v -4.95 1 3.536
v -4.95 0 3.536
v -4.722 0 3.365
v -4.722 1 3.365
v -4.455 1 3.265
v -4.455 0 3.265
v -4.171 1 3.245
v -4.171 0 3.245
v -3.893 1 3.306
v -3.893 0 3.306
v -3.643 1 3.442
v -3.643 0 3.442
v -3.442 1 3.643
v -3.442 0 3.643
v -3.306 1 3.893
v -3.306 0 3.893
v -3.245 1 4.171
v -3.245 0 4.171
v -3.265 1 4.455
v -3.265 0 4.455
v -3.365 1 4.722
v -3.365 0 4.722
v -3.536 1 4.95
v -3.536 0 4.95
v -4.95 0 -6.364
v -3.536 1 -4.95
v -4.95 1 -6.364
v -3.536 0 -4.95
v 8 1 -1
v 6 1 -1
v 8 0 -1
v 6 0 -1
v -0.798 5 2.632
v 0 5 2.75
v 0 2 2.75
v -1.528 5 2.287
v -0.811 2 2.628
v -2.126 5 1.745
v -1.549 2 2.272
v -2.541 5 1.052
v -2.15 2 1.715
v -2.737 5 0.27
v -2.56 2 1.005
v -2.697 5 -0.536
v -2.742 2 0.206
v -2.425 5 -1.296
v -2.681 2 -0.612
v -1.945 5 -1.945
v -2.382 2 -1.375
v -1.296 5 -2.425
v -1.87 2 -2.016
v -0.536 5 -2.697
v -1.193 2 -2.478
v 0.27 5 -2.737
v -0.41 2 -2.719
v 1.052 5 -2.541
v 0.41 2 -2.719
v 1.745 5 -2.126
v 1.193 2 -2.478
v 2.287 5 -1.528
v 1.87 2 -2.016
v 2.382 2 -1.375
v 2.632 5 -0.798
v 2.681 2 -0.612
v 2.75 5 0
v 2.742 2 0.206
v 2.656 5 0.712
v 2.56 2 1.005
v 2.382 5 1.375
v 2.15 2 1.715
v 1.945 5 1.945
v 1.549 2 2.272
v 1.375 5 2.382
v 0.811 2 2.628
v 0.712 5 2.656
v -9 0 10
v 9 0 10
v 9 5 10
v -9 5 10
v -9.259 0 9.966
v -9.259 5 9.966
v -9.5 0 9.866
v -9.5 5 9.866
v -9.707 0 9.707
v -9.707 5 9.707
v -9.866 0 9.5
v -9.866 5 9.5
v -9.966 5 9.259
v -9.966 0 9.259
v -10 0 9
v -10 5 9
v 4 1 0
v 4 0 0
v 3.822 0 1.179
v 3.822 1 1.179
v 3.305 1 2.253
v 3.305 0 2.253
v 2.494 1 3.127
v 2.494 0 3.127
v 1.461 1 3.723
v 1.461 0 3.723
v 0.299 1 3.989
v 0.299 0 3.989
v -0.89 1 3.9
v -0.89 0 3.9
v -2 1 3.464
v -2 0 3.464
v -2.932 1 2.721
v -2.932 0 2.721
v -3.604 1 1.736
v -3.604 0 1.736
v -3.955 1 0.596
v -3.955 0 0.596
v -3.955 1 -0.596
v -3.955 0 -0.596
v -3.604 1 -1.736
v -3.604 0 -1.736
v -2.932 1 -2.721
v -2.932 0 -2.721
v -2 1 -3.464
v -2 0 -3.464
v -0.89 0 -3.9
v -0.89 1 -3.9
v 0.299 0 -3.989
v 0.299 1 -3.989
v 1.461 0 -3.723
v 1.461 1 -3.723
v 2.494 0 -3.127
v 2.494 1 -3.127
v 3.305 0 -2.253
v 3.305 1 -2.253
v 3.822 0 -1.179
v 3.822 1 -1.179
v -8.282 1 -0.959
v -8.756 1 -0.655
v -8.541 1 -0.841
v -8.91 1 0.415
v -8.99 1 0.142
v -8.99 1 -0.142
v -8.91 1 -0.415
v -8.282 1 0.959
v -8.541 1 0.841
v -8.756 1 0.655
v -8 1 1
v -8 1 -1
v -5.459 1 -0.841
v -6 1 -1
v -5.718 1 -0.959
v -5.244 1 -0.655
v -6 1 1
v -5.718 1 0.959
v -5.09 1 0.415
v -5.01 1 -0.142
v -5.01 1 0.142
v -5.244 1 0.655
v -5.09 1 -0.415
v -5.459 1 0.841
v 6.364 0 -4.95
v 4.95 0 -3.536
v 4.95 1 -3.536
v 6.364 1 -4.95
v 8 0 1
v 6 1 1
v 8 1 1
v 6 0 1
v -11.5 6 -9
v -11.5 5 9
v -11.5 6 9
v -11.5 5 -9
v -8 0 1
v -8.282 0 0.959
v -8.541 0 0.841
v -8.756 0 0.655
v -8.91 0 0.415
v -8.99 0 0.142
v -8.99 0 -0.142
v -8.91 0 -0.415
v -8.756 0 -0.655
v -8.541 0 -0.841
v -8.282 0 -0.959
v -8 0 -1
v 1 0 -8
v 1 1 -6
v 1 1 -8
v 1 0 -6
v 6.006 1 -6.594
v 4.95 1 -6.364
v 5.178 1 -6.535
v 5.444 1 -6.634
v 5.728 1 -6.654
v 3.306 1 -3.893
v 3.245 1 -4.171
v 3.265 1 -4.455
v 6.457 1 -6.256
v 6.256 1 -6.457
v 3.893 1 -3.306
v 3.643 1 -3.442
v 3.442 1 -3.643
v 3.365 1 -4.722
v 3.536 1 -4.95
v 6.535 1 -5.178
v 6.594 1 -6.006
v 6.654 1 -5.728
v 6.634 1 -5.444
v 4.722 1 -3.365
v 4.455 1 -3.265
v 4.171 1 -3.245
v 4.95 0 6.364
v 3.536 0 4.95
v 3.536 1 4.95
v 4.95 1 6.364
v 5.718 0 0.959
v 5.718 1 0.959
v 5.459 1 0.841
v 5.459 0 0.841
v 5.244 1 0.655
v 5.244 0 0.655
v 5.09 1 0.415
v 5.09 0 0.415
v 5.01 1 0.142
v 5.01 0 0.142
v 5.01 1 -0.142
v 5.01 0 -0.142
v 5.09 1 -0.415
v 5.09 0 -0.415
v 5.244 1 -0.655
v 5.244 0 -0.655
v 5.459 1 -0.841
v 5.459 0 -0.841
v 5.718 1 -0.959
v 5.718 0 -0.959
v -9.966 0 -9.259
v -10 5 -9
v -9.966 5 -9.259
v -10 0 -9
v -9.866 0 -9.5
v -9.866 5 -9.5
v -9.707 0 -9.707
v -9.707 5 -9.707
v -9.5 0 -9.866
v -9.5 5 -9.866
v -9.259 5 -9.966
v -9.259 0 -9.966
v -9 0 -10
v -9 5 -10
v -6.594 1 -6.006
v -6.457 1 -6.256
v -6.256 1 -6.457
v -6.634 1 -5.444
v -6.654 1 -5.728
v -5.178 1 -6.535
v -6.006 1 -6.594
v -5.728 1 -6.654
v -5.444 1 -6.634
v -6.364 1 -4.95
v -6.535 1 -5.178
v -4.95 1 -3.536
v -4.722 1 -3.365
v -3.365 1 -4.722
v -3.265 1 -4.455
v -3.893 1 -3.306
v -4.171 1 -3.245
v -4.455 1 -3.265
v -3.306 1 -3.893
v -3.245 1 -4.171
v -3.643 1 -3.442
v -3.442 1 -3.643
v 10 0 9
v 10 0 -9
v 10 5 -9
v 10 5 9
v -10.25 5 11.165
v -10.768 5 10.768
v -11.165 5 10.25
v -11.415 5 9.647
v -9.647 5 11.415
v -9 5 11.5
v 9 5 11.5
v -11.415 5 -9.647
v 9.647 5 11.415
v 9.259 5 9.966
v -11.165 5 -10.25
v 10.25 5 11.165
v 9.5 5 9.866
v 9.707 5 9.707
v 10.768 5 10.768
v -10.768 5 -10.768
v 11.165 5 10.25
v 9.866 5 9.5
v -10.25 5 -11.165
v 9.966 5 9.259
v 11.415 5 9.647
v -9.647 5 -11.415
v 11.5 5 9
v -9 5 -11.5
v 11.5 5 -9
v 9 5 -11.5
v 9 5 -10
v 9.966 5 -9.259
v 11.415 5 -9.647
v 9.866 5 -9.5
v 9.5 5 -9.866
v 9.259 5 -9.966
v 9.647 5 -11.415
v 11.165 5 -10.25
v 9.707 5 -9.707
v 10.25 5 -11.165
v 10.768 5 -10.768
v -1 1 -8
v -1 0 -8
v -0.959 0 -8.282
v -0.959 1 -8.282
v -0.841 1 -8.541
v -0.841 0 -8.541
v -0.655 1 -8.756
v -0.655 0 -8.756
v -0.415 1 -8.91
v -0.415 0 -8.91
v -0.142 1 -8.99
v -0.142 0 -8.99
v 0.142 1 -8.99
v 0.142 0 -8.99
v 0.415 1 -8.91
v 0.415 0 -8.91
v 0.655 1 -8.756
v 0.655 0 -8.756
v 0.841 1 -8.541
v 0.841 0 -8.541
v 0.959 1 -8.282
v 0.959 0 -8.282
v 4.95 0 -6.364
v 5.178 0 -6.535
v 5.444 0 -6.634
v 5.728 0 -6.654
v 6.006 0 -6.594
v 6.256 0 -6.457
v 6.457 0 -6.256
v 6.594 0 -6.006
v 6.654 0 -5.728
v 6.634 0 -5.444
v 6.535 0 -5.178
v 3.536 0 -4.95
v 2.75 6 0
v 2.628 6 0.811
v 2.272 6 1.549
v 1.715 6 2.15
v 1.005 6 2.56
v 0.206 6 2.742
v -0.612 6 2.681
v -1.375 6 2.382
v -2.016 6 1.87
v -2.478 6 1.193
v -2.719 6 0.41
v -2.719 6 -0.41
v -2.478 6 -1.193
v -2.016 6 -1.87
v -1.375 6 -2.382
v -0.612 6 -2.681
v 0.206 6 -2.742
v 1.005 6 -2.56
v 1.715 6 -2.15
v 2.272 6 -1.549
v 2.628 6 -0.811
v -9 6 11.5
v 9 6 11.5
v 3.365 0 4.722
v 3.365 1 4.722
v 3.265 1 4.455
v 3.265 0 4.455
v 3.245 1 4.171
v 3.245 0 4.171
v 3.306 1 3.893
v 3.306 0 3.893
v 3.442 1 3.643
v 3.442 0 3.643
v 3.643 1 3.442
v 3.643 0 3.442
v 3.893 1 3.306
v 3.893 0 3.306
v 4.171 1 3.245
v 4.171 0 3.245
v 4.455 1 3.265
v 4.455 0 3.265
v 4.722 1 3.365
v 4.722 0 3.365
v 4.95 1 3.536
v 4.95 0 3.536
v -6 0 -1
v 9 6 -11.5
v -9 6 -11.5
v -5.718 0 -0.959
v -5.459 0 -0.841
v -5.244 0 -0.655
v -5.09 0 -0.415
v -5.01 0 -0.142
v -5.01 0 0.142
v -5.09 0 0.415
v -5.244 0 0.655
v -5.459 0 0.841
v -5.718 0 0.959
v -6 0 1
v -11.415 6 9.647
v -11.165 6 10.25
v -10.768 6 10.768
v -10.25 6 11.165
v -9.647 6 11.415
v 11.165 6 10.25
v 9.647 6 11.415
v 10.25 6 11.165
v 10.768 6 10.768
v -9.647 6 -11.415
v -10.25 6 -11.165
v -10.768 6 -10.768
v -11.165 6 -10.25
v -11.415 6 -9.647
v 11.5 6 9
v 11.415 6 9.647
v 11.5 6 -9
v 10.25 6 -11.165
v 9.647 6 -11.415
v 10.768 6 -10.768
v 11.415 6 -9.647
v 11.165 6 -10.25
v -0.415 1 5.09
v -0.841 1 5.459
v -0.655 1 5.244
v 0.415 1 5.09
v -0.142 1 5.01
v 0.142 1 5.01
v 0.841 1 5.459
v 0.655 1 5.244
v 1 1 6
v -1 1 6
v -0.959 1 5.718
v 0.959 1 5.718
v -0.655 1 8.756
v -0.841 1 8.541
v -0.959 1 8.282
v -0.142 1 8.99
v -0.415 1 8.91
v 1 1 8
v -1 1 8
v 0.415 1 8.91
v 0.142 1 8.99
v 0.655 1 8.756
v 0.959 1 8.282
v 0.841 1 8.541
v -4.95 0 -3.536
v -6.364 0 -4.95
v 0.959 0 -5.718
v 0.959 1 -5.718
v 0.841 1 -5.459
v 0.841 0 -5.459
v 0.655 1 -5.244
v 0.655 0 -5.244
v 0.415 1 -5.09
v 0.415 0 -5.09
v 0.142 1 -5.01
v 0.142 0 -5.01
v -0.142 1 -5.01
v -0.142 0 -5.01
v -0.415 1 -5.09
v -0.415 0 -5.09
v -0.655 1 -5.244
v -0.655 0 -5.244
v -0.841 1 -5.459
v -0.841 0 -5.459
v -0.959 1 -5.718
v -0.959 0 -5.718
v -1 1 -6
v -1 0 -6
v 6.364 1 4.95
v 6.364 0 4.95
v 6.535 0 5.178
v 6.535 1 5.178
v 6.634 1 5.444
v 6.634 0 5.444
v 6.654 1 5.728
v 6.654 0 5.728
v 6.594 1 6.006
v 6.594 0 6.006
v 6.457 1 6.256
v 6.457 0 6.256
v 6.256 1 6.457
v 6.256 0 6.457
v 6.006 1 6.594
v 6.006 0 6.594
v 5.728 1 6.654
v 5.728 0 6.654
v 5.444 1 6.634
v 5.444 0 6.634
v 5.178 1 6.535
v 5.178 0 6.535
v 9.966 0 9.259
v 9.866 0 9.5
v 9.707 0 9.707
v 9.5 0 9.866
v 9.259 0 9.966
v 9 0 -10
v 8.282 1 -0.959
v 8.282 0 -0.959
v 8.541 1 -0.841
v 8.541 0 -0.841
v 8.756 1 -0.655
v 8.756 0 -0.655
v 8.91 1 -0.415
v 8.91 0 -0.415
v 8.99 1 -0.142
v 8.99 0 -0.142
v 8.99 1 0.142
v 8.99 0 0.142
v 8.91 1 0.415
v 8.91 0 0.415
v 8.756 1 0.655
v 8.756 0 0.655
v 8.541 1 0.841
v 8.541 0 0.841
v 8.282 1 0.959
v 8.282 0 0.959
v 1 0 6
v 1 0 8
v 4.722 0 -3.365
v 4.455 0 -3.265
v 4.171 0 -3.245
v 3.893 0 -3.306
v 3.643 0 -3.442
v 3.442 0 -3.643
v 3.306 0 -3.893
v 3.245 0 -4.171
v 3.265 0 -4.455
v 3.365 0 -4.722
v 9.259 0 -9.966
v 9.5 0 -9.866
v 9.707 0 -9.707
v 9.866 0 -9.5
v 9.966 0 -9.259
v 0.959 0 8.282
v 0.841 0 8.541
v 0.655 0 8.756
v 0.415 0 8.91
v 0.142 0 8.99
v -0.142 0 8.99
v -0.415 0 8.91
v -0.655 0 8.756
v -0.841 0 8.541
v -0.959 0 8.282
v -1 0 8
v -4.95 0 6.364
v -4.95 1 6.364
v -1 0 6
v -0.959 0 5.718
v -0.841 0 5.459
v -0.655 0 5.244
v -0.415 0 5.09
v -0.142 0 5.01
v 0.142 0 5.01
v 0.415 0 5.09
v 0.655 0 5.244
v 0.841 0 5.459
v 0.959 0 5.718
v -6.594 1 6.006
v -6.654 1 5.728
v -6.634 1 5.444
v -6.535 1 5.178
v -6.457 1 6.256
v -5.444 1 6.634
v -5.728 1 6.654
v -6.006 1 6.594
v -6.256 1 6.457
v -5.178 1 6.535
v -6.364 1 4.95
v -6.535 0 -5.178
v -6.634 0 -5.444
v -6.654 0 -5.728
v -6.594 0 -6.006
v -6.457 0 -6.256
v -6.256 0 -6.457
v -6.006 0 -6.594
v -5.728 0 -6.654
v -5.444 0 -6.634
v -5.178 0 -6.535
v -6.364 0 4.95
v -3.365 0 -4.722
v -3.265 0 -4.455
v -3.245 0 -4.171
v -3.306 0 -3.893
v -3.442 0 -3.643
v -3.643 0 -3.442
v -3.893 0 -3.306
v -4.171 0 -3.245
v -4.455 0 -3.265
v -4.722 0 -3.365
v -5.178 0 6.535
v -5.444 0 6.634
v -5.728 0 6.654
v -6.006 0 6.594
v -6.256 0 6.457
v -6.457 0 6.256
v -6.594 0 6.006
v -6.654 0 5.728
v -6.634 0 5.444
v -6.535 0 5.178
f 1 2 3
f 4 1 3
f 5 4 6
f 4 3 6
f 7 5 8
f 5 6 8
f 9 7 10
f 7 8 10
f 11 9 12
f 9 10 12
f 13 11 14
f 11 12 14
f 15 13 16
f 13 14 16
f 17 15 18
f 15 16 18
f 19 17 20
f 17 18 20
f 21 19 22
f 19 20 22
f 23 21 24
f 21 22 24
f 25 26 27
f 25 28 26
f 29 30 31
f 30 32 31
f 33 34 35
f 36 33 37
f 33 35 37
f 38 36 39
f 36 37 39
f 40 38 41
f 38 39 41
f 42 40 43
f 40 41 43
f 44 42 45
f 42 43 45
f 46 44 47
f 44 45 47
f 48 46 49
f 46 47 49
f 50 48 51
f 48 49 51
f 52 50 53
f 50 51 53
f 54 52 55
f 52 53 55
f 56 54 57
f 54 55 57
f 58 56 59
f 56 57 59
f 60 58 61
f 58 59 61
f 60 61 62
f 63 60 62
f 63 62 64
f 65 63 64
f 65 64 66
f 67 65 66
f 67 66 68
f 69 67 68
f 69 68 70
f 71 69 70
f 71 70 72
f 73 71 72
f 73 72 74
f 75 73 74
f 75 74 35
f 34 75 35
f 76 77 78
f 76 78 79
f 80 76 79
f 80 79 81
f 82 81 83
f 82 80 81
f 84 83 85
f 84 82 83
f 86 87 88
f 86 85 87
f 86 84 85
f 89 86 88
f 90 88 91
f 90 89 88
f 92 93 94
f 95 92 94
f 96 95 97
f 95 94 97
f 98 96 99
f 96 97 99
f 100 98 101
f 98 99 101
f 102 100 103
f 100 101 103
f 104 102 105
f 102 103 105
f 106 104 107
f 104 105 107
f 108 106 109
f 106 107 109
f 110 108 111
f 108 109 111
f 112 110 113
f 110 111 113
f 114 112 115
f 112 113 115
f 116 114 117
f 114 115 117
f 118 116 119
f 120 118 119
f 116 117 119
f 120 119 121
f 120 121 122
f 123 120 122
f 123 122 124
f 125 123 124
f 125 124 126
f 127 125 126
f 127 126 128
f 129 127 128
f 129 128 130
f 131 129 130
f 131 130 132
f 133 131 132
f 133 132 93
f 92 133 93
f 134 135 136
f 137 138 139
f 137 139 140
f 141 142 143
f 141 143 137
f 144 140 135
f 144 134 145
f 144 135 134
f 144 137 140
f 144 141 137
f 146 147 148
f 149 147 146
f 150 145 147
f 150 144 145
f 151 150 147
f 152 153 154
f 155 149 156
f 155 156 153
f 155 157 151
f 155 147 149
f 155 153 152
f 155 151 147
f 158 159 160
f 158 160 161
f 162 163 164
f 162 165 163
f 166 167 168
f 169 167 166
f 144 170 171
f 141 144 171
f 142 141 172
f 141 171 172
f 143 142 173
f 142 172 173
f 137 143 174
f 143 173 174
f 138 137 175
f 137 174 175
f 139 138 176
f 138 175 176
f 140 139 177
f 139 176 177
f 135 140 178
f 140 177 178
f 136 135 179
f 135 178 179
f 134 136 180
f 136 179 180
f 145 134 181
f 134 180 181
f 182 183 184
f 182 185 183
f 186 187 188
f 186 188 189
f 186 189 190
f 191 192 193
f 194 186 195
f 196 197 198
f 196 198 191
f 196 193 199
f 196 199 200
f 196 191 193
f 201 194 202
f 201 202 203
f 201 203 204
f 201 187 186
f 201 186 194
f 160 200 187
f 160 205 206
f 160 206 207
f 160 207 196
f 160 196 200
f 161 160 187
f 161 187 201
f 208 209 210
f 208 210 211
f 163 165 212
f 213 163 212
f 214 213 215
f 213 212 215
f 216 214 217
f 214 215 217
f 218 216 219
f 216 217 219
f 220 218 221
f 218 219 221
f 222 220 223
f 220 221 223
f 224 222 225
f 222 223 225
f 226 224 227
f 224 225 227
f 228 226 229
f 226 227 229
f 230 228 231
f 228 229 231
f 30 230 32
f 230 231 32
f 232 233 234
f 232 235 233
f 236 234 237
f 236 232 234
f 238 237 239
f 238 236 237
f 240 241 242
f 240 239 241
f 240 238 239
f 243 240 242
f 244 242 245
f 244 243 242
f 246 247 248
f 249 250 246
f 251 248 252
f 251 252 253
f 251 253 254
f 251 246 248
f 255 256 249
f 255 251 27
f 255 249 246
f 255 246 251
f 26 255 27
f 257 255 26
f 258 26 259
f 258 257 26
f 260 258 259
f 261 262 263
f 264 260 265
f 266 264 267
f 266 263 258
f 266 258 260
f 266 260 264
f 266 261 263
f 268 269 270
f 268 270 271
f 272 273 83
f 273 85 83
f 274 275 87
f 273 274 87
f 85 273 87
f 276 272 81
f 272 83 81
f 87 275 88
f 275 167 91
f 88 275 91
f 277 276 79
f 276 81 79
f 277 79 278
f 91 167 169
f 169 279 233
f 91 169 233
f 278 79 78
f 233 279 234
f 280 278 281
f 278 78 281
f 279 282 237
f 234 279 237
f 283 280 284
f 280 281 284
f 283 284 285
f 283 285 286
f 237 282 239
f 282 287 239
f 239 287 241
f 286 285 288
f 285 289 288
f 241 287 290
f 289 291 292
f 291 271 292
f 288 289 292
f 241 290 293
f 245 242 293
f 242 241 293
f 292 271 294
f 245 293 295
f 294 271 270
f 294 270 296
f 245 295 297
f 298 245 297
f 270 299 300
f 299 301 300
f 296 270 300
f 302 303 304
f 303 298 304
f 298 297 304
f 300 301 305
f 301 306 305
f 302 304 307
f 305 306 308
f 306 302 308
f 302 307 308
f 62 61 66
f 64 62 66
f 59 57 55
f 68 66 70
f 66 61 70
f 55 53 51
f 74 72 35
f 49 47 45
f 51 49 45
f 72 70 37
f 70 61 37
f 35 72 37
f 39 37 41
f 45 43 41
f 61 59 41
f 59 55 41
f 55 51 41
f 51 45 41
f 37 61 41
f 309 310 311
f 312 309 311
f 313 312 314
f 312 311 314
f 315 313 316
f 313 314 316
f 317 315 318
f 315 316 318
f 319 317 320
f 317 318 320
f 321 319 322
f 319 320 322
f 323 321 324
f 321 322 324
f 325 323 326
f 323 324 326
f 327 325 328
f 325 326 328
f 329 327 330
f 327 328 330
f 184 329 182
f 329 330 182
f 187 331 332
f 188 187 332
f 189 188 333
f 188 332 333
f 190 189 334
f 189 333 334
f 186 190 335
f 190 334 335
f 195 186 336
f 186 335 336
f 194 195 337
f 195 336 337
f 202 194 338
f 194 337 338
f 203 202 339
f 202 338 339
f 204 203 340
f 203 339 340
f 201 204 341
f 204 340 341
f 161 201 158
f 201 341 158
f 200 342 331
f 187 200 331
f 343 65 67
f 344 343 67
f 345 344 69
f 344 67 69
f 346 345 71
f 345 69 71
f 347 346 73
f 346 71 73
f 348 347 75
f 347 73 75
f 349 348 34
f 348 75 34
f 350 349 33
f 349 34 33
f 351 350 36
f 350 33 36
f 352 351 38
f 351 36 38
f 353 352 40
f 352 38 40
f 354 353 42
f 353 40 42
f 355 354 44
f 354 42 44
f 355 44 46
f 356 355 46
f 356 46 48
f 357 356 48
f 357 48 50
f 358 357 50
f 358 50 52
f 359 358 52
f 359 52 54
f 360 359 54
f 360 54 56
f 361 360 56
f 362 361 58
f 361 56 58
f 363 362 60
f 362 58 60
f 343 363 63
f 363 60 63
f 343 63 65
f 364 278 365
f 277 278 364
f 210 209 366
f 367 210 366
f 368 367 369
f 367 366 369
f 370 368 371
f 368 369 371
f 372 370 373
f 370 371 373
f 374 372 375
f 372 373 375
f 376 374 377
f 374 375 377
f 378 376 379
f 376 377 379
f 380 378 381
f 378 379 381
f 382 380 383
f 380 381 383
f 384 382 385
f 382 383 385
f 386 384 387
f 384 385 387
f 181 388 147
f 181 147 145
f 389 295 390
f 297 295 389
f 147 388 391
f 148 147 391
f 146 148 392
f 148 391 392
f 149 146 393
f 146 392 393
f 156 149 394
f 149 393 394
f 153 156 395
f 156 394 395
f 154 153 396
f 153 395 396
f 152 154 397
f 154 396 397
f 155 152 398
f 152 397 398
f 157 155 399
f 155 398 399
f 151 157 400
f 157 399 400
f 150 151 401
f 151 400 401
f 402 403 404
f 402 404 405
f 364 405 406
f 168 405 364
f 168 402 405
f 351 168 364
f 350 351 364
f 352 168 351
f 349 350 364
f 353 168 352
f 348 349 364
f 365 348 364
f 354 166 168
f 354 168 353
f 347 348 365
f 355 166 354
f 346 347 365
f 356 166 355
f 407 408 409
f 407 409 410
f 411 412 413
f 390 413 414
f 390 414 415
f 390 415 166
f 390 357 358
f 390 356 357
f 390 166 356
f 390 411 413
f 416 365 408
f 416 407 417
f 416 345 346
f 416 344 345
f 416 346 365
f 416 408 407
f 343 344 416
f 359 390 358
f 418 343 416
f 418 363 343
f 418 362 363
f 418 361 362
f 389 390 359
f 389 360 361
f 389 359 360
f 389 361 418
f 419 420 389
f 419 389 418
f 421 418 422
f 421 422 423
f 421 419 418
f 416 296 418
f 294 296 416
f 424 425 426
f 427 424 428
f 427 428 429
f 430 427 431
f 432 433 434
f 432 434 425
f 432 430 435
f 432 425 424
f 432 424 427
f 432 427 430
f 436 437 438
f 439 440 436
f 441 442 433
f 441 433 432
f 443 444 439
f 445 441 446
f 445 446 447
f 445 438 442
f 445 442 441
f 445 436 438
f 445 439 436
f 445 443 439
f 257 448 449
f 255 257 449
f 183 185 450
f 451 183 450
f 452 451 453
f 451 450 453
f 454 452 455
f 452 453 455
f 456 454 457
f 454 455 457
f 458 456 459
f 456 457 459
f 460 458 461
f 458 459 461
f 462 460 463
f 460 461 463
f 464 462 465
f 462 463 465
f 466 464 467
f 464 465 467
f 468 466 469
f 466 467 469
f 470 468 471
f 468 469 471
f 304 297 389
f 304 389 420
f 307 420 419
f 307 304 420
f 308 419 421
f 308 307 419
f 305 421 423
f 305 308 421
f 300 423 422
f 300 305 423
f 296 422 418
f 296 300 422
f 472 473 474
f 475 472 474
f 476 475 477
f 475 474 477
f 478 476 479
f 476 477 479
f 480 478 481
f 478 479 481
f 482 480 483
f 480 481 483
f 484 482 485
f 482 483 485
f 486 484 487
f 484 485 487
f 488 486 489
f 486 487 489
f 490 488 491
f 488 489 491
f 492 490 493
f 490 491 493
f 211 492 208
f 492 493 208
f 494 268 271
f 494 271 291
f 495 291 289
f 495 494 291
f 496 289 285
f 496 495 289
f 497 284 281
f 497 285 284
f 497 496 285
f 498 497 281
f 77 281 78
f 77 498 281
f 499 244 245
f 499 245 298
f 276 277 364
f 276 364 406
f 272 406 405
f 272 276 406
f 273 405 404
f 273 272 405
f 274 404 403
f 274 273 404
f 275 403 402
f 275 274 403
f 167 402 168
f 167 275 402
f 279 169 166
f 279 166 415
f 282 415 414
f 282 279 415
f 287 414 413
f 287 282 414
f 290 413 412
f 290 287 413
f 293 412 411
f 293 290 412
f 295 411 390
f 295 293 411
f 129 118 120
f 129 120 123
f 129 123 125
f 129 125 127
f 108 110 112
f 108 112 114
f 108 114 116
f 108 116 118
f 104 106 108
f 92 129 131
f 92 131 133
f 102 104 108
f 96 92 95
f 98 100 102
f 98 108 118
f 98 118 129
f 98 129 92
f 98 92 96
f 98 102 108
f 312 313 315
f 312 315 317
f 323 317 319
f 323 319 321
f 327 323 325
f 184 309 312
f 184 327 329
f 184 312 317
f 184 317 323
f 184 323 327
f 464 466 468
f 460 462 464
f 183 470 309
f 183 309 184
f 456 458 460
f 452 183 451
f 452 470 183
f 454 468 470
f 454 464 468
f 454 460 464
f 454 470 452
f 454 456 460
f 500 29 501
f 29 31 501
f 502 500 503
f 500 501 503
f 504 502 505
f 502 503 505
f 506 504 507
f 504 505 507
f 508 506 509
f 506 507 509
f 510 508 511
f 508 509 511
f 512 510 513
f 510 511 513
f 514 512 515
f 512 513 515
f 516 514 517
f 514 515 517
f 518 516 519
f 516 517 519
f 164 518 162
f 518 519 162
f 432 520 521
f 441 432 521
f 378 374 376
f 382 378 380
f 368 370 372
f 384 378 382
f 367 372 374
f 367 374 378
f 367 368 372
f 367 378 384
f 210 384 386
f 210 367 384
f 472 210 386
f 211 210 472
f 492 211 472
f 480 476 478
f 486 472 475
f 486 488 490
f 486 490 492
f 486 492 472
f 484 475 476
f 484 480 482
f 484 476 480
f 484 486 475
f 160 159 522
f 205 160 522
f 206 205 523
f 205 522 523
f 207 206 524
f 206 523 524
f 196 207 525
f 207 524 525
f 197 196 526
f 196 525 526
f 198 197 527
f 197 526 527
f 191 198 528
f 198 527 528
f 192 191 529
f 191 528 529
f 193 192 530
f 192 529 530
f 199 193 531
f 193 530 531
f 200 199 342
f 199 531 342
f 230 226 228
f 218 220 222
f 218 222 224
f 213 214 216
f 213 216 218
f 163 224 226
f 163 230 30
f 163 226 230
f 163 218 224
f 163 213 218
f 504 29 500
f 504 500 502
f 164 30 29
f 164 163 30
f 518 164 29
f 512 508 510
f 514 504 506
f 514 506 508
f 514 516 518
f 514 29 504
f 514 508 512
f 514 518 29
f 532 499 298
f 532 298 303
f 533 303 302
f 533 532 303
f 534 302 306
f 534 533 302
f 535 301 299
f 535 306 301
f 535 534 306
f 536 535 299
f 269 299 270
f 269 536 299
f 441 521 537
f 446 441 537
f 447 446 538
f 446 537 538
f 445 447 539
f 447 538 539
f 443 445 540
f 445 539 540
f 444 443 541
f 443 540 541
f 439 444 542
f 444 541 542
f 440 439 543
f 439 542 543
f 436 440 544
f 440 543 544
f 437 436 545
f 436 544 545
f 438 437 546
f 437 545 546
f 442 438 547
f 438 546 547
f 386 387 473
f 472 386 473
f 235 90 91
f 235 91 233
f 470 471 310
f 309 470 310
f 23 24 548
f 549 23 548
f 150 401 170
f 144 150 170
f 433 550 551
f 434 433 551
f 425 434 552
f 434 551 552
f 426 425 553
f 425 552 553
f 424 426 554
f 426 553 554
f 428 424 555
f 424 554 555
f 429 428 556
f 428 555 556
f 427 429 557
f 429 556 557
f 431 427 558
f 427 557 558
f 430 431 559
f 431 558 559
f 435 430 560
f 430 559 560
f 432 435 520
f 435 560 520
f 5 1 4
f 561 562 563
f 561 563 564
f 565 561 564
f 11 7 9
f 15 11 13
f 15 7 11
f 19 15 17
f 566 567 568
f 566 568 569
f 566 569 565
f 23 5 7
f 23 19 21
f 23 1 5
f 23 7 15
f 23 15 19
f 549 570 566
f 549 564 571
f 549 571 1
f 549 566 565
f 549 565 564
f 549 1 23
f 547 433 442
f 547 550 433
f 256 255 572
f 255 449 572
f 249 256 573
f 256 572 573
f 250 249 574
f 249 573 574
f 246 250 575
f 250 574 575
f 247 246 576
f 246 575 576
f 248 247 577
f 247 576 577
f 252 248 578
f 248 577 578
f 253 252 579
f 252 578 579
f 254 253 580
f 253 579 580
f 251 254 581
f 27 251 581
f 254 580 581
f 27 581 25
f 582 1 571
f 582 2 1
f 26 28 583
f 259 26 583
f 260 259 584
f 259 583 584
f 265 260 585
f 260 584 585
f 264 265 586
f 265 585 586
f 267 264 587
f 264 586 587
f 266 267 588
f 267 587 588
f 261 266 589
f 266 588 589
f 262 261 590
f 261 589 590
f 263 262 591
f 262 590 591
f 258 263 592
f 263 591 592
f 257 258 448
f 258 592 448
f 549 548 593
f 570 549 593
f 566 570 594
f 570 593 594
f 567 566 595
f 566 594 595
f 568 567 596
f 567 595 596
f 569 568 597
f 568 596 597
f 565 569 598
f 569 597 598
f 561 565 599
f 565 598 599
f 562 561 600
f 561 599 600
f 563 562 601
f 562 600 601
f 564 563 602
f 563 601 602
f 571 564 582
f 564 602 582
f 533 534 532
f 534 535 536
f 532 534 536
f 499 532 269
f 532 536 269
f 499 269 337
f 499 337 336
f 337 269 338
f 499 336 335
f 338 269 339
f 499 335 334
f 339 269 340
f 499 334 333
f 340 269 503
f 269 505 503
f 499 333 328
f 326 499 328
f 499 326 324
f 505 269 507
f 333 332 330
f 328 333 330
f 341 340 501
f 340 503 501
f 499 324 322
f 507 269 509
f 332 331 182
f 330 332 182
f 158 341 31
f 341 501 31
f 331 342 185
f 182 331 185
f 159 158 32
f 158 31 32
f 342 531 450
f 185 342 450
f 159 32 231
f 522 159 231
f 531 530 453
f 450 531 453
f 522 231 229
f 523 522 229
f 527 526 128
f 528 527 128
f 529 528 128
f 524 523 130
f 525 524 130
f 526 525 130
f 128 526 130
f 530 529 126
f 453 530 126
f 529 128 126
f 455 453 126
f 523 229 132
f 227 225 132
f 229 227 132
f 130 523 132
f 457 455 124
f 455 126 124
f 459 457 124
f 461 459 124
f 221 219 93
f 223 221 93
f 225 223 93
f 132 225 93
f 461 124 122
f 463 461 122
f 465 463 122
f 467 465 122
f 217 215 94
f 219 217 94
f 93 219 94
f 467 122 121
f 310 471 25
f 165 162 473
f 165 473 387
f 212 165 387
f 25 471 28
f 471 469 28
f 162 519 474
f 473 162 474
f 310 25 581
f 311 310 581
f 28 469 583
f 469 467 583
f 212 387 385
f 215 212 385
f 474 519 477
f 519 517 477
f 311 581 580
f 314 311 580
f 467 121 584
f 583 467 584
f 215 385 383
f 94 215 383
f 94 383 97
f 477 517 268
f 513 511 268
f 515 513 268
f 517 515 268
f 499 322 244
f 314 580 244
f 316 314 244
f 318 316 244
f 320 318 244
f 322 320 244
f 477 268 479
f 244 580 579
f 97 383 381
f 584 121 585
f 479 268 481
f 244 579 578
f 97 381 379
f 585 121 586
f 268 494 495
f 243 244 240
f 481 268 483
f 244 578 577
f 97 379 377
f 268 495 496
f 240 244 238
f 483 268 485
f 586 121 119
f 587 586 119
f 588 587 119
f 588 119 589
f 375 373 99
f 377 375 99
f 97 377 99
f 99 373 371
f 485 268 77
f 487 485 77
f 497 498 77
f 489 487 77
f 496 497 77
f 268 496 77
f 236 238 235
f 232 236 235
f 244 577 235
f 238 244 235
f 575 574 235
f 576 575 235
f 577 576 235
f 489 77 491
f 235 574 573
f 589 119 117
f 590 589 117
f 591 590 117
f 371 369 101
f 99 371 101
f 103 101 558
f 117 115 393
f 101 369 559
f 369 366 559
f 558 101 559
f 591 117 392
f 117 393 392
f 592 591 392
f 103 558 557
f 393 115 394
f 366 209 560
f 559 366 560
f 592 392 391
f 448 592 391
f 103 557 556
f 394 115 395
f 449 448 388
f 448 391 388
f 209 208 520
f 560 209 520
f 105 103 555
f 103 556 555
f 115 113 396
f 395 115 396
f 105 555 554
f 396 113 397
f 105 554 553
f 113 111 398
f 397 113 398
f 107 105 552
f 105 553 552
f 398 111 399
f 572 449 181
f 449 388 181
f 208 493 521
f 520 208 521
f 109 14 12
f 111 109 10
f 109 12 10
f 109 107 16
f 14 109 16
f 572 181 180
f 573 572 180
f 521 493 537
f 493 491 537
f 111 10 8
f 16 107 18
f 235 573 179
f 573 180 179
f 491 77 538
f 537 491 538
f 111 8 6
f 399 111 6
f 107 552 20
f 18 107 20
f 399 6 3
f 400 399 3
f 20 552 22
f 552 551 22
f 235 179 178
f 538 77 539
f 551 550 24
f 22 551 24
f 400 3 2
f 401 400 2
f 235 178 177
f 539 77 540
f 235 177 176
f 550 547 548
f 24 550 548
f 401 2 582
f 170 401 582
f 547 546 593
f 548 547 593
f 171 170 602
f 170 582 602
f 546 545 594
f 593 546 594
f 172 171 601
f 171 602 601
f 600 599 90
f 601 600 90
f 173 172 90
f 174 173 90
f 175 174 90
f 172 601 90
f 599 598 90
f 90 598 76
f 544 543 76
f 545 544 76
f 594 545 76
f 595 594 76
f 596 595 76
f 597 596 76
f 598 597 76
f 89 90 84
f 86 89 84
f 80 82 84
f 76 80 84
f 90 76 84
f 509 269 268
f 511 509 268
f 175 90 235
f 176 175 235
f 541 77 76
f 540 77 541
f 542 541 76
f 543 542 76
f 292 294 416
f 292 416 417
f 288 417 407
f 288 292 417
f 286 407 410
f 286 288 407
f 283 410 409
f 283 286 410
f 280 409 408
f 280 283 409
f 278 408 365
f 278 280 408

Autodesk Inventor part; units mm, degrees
ref_plane "YZ Plane" through (0, 0, 0) normal (1, 0, 0) x (0, 1, 0)
ref_plane "XZ Plane" through (0, 0, 0) normal (0, 1, 0) x (-1, 0, 0)
ref_plane "XY Plane" through (0, 0, 0) normal (0, 0, 1) x (1, 0, 0)
sketch "Sketch1" plane through (0, 0, 0) normal (0, 1, 0) x (-1, 0, 0)
  line L0 (9, -10) -> (-9, -10)
  line L1 (-10, -9) -> (-10, 9)
  line L2 (-9, 10) -> (9, 10)
  line L3 (10, 9) -> (10, -9)
  line L4 (10, 10) -> (-10, -10) construction
  line L5 (10, -10) -> (-10, 10) construction
  arc A0 (10, 9) -> (9, 10) centre (9, 9) ccw
  arc A1 (9, -10) -> (10, -9) centre (9, -9) ccw
  arc A2 (-10, -9) -> (-9, -10) centre (-9, -9) ccw
  arc A3 (-9, 10) -> (-10, 9) centre (-9, 9) ccw
  point P0 (0, 0)
  point P1 (0, 0)
  dimension "d7" = 20
  dimension "d9" = 20
  dimension "d10" = 1
extrude "Extrusion1" add sketch "Sketch1" along normal blind 5
sketch "Sketch2" plane through (0, 5, 0) normal (0, 1, 0) x (1, 0, 0)
  line L0 (-10, 9) -> (-10, -9) projected
  arc A0 (-10, -9) -> (-9, -10) centre (-9, -9) ccw projected
  line L1 (-9, -10) -> (9, -10) projected
  arc A1 (9, -10) -> (10, -9) centre (9, -9) ccw projected
  line L2 (10, -9) -> (10, 9) projected
  arc A2 (10, 9) -> (9, 10) centre (9, 9) ccw projected
  line L3 (9, 10) -> (-9, 10) projected
  arc A3 (-9, 10) -> (-10, 9) centre (-9, 9) ccw projected
  line L4 (9, -11.5) -> (-9, -11.5)
  arc A4 (-11.5, -9) -> (-9, -11.5) centre (-9, -9) ccw
  line L5 (-11.5, -9) -> (-11.5, 9)
  arc A5 (-9, 11.5) -> (-11.5, 9) centre (-9, 9) ccw
  line L6 (-9, 11.5) -> (9, 11.5)
  arc A6 (11.5, 9) -> (9, 11.5) centre (9, 9) ccw
  line L7 (11.5, 9) -> (11.5, -9)
  arc A7 (9, -11.5) -> (11.5, -9) centre (9, -9) ccw
  circle A8 centre (0, 0) radius 2.75
  dimension "d16" = 1.5
  dimension "d19" = 5.5
extrude "Extrusion3" add sketch "Sketch2" along normal blind 1 contours A3 L3 A2 L2 A1 L1 A0 L0 | L4 A4 L5 A5 L6 A6 L7 A7
sketch "Sketch3" plane through (0, 0, 0) normal (0, -1, 0) x (1, 0, 0)
  circle A0 centre (0, 0) radius 4
  arc A1 (-6, -1) -> (-6, 1) centre (-6, 0) ccw
  arc A2 (-8, 1) -> (-8, -1) centre (-8, 0) ccw
  line L0 (-6, -1) -> (-8, -1)
  line L1 (-6, 1) -> (-8, 1)
  line L2 (0, 0) -> (-5, 0) construction
  arc A3 (-3.5355, -4.9497) -> (-4.9497, -3.5355) centre (-4.2426, -4.2426) ccw
  line L3 (-3.5355, -4.9497) -> (-4.9497, -6.364)
  line L4 (-4.9497, -3.5355) -> (-6.364, -4.9497)
  arc A4 (-6.364, -4.9497) -> (-4.9497, -6.364) centre (-5.6569, -5.6569) ccw
  arc A5 (1, -6) -> (-1, -6) centre (0, -6) ccw
  line L5 (1, -6) -> (1, -8)
  line L6 (-1, -6) -> (-1, -8)
  arc A6 (-1, -8) -> (1, -8) centre (0, -8) ccw
  arc A7 (4.9497, -3.5355) -> (3.5355, -4.9497) centre (4.2426, -4.2426) ccw
  line L7 (4.9497, -3.5355) -> (6.364, -4.9497)
  line L8 (3.5355, -4.9497) -> (4.9497, -6.364)
  arc A8 (4.9497, -6.364) -> (6.364, -4.9497) centre (5.6569, -5.6569) ccw
  arc A9 (6, 1) -> (6, -1) centre (6, 0) ccw
  line L9 (6, 1) -> (8, 1)
  line L10 (6, -1) -> (8, -1)
  arc A10 (8, -1) -> (8, 1) centre (8, 0) ccw
  arc A11 (3.5355, 4.9497) -> (4.9497, 3.5355) centre (4.2426, 4.2426) ccw
  line L11 (3.5355, 4.9497) -> (4.9497, 6.364)
  line L12 (4.9497, 3.5355) -> (6.364, 4.9497)
  arc A12 (6.364, 4.9497) -> (4.9497, 6.364) centre (5.6569, 5.6569) ccw
  arc A13 (-1, 6) -> (1, 6) centre (0, 6) ccw
  line L13 (-1, 6) -> (-1, 8)
  line L14 (1, 6) -> (1, 8)
  arc A14 (1, 8) -> (-1, 8) centre (0, 8) ccw
  arc A15 (-4.9497, 3.5355) -> (-3.5355, 4.9497) centre (-4.2426, 4.2426) ccw
  line L15 (-4.9497, 3.5355) -> (-6.364, 4.9497)
  line L16 (-3.5355, 4.9497) -> (-4.9497, 6.364)
  arc A16 (-4.9497, 6.364) -> (-6.364, 4.9497) centre (-5.6569, 5.6569) ccw
  dimension "d24" = 2
  dimension "d25" = 2
  dimension "d26" = 2
  dimension "d27" = 6
  dimension "d28" = 360
  dimension "d29" = 16
  dimension "d37" = 8
extrude "Extrusion4" cut sketch "Sketch3" against normal blind 1
hole "Hole1" at (0, 5, 0) direction (0, -1, 0) diameter 5.5 depth 3
equation "\"d7\" = button_side"
equation "\"d9\" = d7"
equation "\"d24\" = d25"
equation "\"d25\" = d26"
equation "\"d27\" = 3 * d26"
equation "\"d37\" = 4 * d26"
equation "\"d0\" = 122"
equation "\"d1\" = 77"
equation "\"d4\" = 19"
equation "\"d5\" = 1"
equation "\"d8\" = 25"
equation "\"d13\" = 1.5"
equation "\"d14\" = 0"
equation "\"d15\" = 2"
equation "\"d30\" = 3.1"
equation "\"d31\" = 3"
equation "\"d33\" = 3"
equation "\"d34\" = 2"
equation "\"d36\" = 3"
equation "\"d38\" = 90deg"
equation "\"d39\" = 8"
equation "\"d40\" = 118deg"
equation "\"d44\" = 0"
equation "\"d45\" = 1.2"
equation "\"d46\" = 2"
equation "\"d47\" = 0"
equation "\"d50\" = 25"
equation "\"button_side\" = 20"
equation "\"d3\" = 1.01 * button_side"
equation "\"d2\" = d3"
properties part number "button1" material "Bronze, Soft Tin"
